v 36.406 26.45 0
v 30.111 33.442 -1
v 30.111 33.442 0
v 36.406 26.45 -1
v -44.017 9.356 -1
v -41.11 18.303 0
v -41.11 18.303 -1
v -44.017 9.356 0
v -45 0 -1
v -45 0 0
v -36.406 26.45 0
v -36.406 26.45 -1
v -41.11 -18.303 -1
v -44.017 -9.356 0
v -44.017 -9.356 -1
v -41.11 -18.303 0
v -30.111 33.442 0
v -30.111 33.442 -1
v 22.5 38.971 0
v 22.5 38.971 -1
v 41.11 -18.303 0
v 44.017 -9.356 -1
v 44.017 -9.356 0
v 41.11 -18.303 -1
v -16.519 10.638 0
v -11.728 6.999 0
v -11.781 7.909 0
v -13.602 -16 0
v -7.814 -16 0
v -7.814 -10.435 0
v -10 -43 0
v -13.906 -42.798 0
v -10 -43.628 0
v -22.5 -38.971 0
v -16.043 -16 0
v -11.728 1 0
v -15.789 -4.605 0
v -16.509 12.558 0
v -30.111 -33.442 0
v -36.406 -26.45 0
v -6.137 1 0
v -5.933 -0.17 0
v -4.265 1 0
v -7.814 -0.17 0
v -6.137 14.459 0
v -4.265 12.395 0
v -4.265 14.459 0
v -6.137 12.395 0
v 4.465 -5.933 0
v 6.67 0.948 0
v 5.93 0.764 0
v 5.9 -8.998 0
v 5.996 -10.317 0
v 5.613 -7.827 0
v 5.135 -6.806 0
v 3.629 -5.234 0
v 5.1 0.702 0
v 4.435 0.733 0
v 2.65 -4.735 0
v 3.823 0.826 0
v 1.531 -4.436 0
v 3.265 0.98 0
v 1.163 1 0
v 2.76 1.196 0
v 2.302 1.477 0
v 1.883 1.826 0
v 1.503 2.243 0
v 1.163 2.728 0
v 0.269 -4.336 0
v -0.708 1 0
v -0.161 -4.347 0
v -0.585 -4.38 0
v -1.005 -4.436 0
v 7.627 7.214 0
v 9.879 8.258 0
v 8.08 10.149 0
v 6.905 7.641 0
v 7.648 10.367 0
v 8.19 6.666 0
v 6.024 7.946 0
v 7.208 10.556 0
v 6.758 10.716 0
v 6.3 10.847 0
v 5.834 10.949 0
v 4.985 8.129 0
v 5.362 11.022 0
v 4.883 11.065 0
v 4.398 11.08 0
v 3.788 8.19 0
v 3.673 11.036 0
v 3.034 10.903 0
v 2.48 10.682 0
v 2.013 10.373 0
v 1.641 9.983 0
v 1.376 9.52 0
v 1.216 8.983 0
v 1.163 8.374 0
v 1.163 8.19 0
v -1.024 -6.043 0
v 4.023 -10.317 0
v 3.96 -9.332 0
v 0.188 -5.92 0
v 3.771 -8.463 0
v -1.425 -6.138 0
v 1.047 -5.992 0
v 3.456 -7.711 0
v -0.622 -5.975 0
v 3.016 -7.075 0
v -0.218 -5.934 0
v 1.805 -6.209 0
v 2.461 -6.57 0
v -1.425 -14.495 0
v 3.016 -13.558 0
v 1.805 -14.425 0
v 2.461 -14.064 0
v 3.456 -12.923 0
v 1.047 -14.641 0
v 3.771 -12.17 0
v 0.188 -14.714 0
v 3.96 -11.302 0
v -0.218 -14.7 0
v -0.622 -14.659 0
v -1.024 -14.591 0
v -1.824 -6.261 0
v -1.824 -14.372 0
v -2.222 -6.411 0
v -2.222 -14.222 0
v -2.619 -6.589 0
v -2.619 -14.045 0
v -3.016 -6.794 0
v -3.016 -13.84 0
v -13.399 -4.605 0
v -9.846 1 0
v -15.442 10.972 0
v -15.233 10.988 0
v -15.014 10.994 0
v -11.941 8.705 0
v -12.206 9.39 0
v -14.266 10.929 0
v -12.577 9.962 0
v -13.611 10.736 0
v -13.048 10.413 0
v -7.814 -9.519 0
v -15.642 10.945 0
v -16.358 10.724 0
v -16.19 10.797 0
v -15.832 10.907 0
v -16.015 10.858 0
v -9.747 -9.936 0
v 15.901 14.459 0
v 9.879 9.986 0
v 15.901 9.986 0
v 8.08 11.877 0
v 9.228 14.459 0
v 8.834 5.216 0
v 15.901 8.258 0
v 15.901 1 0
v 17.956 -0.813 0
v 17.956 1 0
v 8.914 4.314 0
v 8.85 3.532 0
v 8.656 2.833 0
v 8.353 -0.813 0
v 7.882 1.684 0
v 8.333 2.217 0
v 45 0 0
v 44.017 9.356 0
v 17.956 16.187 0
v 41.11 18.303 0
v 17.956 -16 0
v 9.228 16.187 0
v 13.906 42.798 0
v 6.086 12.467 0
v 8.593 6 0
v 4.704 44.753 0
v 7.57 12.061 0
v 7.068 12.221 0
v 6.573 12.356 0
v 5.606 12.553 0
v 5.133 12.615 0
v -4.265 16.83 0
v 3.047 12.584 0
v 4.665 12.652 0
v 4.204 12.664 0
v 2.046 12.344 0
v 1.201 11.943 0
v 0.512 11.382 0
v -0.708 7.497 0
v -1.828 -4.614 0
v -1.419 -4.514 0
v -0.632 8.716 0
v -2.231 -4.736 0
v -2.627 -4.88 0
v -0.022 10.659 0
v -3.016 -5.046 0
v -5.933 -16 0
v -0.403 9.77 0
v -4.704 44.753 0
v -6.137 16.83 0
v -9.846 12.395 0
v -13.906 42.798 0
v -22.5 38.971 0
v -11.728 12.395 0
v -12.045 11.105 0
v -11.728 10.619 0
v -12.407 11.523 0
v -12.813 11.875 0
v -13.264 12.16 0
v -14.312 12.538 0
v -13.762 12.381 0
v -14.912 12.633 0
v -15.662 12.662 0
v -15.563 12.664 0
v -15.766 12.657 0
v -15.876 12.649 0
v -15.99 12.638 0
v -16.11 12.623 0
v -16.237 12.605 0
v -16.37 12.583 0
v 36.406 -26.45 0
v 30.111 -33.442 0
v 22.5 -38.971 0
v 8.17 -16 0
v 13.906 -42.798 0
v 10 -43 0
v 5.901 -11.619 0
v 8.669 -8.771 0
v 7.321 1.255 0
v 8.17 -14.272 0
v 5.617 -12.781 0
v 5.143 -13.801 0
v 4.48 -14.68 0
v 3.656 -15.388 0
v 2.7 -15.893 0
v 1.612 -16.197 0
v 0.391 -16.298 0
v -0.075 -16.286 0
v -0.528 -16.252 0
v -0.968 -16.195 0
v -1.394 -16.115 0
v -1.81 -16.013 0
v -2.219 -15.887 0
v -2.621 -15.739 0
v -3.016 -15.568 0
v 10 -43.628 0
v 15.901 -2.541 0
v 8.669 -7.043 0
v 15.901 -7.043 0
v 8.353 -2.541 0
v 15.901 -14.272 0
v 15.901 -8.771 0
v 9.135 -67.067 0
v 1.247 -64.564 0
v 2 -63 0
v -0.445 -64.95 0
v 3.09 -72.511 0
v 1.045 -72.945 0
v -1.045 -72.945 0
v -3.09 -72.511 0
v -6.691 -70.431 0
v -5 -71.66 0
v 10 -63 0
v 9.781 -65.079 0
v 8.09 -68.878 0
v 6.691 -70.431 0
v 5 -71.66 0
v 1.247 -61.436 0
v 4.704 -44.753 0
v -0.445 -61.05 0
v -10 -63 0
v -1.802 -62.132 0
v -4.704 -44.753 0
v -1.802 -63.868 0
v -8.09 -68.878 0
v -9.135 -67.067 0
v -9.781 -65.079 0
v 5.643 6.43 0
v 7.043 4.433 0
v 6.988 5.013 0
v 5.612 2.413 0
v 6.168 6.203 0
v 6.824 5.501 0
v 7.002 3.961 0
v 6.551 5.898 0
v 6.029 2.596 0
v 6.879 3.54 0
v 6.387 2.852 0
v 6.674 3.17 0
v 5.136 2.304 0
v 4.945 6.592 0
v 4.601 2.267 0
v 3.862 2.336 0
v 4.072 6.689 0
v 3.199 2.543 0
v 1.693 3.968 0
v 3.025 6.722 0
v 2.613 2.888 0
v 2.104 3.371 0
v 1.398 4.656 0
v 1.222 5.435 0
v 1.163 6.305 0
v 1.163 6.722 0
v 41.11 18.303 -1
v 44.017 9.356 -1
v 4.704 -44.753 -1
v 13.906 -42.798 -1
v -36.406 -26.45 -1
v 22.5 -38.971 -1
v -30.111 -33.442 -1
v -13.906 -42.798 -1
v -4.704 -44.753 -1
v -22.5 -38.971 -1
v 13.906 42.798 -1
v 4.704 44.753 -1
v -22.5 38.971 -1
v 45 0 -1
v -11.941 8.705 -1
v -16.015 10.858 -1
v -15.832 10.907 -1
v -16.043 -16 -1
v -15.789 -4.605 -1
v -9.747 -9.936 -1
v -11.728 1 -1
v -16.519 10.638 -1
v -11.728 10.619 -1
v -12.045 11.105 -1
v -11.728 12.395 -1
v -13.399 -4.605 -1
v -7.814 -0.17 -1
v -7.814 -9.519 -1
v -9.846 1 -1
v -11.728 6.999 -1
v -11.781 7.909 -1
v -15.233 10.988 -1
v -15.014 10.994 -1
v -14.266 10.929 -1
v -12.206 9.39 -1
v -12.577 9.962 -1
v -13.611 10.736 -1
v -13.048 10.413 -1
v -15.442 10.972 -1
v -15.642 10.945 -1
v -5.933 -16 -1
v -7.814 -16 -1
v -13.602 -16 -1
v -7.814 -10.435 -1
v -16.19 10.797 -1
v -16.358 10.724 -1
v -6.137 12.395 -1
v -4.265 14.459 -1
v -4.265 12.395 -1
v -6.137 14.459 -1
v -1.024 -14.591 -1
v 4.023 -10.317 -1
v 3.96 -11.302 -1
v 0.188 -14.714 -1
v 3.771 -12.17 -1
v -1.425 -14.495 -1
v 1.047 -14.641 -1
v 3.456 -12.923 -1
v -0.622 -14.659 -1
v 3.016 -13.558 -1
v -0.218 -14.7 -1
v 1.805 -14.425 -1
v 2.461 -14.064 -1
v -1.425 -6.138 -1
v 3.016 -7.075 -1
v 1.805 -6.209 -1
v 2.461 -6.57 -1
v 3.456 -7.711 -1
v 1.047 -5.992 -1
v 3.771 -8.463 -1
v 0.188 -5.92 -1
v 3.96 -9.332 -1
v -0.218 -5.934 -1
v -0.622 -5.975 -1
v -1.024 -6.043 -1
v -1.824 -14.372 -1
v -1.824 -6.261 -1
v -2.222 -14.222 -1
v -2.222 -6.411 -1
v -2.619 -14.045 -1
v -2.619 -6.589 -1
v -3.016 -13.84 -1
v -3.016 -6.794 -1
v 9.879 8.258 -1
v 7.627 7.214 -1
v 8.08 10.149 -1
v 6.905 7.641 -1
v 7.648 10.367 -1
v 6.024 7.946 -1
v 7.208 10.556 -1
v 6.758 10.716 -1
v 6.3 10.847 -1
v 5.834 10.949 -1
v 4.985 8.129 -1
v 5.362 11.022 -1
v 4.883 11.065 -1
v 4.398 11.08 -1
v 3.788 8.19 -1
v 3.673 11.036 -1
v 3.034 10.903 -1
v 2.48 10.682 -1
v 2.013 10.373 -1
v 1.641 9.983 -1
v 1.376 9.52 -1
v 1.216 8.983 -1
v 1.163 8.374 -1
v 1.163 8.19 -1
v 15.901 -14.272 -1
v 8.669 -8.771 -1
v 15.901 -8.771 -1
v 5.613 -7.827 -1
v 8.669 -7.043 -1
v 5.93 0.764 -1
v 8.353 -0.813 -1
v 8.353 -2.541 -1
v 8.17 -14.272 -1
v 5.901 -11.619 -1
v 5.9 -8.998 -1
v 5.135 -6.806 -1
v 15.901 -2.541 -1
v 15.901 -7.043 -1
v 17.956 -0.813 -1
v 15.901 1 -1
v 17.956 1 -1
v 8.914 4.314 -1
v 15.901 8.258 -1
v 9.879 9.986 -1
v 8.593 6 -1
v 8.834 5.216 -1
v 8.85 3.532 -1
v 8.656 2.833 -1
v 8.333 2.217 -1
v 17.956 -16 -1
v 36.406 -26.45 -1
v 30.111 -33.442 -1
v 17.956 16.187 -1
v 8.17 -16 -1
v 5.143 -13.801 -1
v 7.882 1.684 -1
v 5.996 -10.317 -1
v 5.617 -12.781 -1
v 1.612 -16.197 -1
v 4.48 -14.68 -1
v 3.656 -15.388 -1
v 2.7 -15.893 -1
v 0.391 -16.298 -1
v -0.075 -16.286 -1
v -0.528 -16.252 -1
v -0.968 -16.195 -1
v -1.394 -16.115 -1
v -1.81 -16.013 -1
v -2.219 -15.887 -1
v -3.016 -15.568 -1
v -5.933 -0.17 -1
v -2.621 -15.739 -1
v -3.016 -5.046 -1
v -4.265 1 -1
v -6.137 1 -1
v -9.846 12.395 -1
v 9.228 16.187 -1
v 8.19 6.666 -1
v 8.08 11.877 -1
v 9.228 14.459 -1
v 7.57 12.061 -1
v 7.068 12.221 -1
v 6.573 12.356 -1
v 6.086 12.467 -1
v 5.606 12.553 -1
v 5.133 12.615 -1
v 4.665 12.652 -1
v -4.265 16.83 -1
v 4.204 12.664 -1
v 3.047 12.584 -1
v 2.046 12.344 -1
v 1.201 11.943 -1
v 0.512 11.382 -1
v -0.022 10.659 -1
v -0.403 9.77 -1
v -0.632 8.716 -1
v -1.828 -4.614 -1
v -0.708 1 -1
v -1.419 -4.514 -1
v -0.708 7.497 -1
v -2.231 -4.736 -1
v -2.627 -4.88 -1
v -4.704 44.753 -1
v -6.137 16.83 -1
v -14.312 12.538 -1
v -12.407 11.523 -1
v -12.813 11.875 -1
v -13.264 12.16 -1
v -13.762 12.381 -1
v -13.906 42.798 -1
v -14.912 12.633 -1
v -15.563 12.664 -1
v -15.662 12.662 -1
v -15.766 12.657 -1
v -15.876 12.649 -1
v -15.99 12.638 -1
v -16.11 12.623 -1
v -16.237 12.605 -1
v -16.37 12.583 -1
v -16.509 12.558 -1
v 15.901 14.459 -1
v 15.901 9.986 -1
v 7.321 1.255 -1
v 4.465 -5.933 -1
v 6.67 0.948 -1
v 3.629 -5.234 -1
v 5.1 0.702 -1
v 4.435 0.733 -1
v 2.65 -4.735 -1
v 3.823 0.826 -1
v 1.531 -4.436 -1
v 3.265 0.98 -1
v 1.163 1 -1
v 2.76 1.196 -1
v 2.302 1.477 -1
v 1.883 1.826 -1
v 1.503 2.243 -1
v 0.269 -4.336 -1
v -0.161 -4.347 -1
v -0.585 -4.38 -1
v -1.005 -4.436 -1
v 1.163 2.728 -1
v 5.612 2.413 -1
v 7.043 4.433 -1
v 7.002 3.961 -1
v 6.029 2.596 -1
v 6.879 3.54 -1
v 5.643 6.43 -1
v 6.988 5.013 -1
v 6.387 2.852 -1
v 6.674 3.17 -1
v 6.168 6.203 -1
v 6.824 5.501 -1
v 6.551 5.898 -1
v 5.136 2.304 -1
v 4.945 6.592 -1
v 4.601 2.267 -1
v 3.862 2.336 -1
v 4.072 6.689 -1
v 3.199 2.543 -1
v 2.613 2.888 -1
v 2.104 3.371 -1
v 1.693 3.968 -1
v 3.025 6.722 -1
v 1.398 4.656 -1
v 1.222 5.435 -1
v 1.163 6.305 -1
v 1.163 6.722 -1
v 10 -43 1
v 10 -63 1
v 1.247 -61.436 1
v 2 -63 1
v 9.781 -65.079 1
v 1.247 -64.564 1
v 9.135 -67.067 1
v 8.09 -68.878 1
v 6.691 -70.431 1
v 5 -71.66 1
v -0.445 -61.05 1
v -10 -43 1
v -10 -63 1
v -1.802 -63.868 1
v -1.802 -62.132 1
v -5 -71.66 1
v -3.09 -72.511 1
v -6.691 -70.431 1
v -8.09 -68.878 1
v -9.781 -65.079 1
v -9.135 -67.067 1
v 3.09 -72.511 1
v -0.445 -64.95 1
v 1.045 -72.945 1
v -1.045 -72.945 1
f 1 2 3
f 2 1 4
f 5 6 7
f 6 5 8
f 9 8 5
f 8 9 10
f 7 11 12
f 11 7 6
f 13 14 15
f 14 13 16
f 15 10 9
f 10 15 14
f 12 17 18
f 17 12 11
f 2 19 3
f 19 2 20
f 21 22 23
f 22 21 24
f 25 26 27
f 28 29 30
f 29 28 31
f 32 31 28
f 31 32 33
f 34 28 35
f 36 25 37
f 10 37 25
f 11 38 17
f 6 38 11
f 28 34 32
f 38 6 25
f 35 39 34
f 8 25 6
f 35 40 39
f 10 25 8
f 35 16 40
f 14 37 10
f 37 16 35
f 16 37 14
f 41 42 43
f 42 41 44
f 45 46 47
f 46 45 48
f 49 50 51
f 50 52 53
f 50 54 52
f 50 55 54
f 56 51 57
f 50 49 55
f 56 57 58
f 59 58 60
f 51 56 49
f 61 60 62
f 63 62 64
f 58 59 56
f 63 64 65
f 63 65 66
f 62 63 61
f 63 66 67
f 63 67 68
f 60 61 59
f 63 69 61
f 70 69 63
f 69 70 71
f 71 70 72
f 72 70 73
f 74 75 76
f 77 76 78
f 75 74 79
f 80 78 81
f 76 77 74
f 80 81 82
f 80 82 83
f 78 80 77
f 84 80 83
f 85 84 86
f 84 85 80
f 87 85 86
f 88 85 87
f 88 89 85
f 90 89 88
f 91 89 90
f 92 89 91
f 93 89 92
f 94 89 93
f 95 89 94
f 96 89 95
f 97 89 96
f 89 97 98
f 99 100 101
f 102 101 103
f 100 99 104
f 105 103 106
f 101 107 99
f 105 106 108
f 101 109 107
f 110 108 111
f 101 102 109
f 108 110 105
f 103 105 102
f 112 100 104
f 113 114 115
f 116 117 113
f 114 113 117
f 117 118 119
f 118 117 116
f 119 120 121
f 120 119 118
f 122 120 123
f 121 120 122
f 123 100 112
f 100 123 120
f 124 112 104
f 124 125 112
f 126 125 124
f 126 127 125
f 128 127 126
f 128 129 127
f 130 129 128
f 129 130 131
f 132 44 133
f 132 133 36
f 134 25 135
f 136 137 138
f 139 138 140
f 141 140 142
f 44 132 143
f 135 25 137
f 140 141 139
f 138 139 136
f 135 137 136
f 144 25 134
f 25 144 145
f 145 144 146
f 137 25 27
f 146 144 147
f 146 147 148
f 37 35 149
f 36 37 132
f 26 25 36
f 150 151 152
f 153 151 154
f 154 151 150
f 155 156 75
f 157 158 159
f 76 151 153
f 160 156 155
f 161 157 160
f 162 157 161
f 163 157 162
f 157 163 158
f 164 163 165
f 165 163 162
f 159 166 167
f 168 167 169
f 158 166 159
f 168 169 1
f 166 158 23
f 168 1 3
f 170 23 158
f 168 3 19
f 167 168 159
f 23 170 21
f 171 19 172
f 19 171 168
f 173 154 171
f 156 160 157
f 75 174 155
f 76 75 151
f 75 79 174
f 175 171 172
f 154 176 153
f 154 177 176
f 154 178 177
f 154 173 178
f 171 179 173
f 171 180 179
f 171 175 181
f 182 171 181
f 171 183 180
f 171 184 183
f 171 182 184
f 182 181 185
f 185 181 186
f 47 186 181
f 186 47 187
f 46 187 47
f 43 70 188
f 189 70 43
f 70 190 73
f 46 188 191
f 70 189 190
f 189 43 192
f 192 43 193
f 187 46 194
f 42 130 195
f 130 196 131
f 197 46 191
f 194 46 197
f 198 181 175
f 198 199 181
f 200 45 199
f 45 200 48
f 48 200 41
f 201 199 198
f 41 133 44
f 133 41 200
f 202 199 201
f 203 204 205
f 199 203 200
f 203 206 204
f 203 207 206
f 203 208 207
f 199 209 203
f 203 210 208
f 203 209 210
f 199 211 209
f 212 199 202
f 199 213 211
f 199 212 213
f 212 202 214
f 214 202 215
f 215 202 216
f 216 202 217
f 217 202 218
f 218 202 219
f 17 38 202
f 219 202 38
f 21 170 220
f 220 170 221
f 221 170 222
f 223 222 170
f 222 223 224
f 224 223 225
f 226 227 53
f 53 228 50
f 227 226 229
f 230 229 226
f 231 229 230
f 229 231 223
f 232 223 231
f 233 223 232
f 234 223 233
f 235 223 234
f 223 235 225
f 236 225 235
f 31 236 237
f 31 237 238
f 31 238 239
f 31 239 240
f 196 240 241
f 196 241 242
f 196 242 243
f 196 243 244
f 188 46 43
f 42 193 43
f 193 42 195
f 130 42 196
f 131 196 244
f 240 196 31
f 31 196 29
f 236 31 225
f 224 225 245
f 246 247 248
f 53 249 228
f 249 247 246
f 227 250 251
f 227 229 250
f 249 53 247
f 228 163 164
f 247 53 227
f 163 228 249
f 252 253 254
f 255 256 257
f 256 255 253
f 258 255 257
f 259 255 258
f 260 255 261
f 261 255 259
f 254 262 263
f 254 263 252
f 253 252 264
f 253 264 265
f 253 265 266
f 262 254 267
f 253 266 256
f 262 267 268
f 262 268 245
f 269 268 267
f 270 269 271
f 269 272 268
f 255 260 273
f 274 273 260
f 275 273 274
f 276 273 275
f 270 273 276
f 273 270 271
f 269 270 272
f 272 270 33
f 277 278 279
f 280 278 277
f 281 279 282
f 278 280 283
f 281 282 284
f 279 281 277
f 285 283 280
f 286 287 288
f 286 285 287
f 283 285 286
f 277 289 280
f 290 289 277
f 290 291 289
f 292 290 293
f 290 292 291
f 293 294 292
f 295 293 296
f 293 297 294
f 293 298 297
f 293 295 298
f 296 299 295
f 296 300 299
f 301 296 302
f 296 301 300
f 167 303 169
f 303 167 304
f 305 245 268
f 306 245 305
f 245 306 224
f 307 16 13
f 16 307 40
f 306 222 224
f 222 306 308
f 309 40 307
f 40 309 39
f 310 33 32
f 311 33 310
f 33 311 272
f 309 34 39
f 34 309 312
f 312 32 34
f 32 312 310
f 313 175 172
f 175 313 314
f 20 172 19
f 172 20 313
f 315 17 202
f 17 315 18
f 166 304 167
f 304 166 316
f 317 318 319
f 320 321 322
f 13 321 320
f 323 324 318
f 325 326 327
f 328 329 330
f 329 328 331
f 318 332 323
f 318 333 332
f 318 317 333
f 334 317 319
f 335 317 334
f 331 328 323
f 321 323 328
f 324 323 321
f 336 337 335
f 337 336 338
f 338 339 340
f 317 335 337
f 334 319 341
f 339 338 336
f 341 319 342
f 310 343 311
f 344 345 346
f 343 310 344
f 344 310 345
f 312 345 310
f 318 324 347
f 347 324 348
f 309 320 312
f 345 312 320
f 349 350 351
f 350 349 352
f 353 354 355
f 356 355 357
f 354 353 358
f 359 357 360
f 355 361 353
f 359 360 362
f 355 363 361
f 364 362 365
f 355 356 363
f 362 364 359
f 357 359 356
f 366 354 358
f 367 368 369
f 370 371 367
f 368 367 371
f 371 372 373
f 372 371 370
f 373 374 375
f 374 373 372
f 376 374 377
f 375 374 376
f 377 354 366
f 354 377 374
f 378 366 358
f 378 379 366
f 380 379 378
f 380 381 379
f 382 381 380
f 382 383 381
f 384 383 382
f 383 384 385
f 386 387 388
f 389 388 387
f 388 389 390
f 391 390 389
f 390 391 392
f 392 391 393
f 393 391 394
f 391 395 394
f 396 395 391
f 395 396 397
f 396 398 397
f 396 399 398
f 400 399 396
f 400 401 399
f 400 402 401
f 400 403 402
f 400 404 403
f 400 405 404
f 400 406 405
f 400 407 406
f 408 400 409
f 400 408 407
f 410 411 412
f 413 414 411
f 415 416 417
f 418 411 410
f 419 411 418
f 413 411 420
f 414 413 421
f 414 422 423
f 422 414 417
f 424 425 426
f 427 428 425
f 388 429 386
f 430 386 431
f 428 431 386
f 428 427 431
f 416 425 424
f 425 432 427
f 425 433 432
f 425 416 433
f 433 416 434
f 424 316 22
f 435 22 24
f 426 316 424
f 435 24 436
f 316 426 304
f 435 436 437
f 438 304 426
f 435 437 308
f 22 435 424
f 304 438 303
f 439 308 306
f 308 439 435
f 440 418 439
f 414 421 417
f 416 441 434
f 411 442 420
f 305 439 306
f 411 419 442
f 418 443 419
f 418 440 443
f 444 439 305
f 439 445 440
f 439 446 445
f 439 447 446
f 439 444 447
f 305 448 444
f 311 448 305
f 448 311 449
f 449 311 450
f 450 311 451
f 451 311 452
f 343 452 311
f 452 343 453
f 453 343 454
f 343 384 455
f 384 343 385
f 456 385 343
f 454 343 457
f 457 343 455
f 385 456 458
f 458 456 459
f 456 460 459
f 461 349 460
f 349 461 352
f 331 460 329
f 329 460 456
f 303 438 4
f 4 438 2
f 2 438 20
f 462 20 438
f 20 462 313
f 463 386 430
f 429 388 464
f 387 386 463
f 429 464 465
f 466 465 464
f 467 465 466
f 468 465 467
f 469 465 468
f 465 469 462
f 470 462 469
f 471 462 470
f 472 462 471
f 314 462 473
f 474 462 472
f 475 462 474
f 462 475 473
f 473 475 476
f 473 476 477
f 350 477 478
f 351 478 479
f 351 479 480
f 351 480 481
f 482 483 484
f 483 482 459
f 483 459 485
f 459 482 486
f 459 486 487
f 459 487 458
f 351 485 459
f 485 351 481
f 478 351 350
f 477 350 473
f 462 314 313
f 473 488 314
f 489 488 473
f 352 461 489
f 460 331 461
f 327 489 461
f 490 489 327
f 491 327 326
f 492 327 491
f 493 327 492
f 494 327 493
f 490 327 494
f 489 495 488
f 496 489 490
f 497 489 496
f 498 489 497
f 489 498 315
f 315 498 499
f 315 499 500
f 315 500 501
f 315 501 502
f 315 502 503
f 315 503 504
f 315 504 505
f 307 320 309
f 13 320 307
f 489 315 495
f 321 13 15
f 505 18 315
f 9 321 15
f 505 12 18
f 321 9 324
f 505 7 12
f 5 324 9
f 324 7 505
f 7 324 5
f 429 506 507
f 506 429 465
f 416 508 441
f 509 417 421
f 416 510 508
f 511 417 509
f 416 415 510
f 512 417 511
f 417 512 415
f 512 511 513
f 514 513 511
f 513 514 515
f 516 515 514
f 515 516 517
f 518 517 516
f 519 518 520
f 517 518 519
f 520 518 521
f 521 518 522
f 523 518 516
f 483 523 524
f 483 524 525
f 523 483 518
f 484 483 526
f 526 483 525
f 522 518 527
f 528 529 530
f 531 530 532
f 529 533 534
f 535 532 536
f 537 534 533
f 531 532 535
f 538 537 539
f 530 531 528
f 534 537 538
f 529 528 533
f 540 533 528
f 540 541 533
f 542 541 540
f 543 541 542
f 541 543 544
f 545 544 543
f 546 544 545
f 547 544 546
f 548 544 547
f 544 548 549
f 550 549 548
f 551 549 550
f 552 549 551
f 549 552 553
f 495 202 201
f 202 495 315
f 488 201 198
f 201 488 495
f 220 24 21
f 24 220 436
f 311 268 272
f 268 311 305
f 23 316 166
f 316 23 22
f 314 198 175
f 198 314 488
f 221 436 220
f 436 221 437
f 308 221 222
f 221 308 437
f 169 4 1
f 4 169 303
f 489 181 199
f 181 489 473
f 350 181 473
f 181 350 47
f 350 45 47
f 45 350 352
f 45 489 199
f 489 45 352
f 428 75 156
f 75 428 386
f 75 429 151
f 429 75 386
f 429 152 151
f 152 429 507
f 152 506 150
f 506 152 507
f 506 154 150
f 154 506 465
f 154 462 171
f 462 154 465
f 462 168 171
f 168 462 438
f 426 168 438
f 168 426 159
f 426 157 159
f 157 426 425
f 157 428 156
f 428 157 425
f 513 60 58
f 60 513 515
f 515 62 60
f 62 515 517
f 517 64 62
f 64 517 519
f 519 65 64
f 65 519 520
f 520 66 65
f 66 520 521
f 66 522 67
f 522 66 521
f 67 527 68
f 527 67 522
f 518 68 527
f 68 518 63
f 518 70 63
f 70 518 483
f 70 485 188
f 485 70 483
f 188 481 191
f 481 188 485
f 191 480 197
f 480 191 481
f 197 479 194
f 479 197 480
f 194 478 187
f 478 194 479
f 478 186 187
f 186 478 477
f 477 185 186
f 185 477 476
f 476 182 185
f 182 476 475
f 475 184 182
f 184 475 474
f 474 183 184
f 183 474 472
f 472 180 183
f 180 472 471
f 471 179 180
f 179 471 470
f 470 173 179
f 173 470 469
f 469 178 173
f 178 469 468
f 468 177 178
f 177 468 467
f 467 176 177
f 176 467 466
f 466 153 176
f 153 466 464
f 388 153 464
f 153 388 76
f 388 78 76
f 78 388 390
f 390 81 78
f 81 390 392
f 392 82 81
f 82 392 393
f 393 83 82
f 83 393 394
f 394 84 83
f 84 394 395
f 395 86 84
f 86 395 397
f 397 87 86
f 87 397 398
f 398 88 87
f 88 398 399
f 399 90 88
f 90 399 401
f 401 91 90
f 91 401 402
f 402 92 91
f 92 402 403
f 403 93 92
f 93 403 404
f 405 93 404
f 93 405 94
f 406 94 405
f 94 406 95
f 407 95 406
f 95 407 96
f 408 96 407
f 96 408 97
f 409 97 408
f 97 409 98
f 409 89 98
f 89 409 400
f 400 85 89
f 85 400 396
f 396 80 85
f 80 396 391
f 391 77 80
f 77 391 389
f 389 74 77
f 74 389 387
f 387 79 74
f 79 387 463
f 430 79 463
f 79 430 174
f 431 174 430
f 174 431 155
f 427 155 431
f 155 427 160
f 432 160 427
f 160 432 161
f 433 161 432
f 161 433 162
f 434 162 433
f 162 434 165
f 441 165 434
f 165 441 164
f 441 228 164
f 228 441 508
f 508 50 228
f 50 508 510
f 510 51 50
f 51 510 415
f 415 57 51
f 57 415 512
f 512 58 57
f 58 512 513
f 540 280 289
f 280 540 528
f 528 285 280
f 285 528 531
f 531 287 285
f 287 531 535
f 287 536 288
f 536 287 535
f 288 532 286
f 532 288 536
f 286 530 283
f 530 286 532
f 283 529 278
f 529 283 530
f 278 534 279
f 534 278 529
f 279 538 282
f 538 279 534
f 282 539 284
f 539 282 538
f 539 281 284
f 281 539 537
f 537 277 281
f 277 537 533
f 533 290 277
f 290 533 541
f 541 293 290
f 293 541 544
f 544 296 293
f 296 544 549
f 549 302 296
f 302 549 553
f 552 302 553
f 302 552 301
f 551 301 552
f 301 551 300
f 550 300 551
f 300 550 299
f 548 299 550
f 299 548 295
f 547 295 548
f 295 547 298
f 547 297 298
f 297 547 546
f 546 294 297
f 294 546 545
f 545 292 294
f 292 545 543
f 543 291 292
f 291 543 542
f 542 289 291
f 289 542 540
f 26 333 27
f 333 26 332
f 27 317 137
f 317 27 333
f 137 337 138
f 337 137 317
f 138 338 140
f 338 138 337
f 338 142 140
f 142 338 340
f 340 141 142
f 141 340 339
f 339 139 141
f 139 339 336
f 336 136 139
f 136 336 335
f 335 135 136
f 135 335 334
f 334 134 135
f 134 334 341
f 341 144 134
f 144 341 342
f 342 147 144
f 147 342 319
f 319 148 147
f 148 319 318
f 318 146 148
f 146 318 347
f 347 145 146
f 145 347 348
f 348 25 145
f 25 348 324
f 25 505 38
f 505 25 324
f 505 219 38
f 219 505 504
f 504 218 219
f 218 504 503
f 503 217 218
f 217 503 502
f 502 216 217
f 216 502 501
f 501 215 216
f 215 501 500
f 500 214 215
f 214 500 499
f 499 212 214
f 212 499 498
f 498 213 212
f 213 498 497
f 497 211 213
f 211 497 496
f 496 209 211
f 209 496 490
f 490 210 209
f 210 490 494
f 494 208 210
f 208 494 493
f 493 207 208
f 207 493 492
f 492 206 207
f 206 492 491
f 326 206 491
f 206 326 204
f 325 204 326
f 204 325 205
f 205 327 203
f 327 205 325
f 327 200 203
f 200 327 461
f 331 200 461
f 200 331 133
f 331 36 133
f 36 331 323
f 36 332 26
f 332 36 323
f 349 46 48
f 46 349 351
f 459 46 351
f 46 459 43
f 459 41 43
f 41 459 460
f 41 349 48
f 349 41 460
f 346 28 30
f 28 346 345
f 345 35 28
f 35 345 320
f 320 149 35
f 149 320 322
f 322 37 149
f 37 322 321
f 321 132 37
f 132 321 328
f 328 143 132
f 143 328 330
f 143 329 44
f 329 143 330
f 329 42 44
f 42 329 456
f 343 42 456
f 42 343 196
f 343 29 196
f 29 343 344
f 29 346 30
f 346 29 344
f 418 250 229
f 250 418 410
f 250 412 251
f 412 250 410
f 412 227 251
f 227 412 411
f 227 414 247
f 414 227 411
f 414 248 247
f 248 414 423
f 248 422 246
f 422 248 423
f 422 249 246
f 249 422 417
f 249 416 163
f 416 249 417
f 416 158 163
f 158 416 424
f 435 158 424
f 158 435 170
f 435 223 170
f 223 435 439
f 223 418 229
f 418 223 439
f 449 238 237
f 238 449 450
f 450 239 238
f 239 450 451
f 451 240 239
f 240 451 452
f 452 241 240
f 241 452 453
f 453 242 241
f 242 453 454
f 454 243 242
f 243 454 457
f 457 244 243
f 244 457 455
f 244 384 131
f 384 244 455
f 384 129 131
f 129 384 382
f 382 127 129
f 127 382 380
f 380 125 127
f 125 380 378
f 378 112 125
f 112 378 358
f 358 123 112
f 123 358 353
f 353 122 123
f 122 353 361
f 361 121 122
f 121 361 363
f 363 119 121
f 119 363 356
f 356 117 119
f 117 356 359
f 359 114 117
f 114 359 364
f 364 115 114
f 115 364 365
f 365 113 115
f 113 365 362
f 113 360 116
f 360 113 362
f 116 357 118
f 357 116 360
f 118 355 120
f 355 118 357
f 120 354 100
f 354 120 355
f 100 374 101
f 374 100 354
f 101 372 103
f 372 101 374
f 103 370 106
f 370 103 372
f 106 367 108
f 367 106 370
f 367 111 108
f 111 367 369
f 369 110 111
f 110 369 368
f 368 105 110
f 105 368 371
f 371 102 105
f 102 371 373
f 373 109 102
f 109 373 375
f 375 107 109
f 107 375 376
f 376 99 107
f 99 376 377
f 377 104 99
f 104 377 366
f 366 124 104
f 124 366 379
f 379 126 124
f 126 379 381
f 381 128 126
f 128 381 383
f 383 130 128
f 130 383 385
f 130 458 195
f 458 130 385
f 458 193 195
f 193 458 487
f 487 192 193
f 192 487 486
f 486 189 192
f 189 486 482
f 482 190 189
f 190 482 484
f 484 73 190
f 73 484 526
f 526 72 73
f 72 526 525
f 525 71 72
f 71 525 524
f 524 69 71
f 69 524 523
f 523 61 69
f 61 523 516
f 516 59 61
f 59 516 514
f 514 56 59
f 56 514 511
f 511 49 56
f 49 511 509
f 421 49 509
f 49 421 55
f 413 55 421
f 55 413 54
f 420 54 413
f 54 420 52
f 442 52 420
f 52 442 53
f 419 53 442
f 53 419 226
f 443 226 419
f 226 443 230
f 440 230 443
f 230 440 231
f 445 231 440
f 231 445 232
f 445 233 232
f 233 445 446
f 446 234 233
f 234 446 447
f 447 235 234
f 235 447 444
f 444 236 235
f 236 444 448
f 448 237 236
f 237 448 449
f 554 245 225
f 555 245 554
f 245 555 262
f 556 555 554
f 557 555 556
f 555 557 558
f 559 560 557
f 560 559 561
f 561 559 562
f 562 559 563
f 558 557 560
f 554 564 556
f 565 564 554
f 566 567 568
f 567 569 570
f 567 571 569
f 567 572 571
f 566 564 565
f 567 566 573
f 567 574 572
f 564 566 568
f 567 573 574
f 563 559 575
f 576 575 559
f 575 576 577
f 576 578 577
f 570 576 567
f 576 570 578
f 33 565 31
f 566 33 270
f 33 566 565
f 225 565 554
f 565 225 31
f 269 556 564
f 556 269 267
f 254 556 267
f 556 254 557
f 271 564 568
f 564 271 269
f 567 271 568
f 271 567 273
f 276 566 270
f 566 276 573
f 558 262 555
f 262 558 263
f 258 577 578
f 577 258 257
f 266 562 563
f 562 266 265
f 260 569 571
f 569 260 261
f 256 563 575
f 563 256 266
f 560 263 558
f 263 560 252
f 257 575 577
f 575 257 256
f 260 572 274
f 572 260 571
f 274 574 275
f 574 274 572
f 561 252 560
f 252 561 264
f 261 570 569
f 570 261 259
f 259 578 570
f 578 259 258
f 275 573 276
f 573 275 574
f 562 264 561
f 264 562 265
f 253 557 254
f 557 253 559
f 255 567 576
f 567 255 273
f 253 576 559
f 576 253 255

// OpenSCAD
rotate([0, 180, 0]) difference() {
 cylinder(1, r=45);
 translate([-20, 1, 0]) linear_extrude(1) text("Fair", size=15, font="CutOutsFLF:style=Regular");
 translate([-20, - 16, 0])  linear_extrude(1) text("Eck", size=15, font="CutOutsFLF:style=Regular");
}

difference() {
translate([-10, -63, 0]) cube([20,  20, 1]);
translate([0, -63, 0]) cylinder(1, r=2);
}

difference() {
translate([0, -63, 0]) cylinder(1, r=10);
translate([0, -63, 0]) cylinder(1, r=2);
}
